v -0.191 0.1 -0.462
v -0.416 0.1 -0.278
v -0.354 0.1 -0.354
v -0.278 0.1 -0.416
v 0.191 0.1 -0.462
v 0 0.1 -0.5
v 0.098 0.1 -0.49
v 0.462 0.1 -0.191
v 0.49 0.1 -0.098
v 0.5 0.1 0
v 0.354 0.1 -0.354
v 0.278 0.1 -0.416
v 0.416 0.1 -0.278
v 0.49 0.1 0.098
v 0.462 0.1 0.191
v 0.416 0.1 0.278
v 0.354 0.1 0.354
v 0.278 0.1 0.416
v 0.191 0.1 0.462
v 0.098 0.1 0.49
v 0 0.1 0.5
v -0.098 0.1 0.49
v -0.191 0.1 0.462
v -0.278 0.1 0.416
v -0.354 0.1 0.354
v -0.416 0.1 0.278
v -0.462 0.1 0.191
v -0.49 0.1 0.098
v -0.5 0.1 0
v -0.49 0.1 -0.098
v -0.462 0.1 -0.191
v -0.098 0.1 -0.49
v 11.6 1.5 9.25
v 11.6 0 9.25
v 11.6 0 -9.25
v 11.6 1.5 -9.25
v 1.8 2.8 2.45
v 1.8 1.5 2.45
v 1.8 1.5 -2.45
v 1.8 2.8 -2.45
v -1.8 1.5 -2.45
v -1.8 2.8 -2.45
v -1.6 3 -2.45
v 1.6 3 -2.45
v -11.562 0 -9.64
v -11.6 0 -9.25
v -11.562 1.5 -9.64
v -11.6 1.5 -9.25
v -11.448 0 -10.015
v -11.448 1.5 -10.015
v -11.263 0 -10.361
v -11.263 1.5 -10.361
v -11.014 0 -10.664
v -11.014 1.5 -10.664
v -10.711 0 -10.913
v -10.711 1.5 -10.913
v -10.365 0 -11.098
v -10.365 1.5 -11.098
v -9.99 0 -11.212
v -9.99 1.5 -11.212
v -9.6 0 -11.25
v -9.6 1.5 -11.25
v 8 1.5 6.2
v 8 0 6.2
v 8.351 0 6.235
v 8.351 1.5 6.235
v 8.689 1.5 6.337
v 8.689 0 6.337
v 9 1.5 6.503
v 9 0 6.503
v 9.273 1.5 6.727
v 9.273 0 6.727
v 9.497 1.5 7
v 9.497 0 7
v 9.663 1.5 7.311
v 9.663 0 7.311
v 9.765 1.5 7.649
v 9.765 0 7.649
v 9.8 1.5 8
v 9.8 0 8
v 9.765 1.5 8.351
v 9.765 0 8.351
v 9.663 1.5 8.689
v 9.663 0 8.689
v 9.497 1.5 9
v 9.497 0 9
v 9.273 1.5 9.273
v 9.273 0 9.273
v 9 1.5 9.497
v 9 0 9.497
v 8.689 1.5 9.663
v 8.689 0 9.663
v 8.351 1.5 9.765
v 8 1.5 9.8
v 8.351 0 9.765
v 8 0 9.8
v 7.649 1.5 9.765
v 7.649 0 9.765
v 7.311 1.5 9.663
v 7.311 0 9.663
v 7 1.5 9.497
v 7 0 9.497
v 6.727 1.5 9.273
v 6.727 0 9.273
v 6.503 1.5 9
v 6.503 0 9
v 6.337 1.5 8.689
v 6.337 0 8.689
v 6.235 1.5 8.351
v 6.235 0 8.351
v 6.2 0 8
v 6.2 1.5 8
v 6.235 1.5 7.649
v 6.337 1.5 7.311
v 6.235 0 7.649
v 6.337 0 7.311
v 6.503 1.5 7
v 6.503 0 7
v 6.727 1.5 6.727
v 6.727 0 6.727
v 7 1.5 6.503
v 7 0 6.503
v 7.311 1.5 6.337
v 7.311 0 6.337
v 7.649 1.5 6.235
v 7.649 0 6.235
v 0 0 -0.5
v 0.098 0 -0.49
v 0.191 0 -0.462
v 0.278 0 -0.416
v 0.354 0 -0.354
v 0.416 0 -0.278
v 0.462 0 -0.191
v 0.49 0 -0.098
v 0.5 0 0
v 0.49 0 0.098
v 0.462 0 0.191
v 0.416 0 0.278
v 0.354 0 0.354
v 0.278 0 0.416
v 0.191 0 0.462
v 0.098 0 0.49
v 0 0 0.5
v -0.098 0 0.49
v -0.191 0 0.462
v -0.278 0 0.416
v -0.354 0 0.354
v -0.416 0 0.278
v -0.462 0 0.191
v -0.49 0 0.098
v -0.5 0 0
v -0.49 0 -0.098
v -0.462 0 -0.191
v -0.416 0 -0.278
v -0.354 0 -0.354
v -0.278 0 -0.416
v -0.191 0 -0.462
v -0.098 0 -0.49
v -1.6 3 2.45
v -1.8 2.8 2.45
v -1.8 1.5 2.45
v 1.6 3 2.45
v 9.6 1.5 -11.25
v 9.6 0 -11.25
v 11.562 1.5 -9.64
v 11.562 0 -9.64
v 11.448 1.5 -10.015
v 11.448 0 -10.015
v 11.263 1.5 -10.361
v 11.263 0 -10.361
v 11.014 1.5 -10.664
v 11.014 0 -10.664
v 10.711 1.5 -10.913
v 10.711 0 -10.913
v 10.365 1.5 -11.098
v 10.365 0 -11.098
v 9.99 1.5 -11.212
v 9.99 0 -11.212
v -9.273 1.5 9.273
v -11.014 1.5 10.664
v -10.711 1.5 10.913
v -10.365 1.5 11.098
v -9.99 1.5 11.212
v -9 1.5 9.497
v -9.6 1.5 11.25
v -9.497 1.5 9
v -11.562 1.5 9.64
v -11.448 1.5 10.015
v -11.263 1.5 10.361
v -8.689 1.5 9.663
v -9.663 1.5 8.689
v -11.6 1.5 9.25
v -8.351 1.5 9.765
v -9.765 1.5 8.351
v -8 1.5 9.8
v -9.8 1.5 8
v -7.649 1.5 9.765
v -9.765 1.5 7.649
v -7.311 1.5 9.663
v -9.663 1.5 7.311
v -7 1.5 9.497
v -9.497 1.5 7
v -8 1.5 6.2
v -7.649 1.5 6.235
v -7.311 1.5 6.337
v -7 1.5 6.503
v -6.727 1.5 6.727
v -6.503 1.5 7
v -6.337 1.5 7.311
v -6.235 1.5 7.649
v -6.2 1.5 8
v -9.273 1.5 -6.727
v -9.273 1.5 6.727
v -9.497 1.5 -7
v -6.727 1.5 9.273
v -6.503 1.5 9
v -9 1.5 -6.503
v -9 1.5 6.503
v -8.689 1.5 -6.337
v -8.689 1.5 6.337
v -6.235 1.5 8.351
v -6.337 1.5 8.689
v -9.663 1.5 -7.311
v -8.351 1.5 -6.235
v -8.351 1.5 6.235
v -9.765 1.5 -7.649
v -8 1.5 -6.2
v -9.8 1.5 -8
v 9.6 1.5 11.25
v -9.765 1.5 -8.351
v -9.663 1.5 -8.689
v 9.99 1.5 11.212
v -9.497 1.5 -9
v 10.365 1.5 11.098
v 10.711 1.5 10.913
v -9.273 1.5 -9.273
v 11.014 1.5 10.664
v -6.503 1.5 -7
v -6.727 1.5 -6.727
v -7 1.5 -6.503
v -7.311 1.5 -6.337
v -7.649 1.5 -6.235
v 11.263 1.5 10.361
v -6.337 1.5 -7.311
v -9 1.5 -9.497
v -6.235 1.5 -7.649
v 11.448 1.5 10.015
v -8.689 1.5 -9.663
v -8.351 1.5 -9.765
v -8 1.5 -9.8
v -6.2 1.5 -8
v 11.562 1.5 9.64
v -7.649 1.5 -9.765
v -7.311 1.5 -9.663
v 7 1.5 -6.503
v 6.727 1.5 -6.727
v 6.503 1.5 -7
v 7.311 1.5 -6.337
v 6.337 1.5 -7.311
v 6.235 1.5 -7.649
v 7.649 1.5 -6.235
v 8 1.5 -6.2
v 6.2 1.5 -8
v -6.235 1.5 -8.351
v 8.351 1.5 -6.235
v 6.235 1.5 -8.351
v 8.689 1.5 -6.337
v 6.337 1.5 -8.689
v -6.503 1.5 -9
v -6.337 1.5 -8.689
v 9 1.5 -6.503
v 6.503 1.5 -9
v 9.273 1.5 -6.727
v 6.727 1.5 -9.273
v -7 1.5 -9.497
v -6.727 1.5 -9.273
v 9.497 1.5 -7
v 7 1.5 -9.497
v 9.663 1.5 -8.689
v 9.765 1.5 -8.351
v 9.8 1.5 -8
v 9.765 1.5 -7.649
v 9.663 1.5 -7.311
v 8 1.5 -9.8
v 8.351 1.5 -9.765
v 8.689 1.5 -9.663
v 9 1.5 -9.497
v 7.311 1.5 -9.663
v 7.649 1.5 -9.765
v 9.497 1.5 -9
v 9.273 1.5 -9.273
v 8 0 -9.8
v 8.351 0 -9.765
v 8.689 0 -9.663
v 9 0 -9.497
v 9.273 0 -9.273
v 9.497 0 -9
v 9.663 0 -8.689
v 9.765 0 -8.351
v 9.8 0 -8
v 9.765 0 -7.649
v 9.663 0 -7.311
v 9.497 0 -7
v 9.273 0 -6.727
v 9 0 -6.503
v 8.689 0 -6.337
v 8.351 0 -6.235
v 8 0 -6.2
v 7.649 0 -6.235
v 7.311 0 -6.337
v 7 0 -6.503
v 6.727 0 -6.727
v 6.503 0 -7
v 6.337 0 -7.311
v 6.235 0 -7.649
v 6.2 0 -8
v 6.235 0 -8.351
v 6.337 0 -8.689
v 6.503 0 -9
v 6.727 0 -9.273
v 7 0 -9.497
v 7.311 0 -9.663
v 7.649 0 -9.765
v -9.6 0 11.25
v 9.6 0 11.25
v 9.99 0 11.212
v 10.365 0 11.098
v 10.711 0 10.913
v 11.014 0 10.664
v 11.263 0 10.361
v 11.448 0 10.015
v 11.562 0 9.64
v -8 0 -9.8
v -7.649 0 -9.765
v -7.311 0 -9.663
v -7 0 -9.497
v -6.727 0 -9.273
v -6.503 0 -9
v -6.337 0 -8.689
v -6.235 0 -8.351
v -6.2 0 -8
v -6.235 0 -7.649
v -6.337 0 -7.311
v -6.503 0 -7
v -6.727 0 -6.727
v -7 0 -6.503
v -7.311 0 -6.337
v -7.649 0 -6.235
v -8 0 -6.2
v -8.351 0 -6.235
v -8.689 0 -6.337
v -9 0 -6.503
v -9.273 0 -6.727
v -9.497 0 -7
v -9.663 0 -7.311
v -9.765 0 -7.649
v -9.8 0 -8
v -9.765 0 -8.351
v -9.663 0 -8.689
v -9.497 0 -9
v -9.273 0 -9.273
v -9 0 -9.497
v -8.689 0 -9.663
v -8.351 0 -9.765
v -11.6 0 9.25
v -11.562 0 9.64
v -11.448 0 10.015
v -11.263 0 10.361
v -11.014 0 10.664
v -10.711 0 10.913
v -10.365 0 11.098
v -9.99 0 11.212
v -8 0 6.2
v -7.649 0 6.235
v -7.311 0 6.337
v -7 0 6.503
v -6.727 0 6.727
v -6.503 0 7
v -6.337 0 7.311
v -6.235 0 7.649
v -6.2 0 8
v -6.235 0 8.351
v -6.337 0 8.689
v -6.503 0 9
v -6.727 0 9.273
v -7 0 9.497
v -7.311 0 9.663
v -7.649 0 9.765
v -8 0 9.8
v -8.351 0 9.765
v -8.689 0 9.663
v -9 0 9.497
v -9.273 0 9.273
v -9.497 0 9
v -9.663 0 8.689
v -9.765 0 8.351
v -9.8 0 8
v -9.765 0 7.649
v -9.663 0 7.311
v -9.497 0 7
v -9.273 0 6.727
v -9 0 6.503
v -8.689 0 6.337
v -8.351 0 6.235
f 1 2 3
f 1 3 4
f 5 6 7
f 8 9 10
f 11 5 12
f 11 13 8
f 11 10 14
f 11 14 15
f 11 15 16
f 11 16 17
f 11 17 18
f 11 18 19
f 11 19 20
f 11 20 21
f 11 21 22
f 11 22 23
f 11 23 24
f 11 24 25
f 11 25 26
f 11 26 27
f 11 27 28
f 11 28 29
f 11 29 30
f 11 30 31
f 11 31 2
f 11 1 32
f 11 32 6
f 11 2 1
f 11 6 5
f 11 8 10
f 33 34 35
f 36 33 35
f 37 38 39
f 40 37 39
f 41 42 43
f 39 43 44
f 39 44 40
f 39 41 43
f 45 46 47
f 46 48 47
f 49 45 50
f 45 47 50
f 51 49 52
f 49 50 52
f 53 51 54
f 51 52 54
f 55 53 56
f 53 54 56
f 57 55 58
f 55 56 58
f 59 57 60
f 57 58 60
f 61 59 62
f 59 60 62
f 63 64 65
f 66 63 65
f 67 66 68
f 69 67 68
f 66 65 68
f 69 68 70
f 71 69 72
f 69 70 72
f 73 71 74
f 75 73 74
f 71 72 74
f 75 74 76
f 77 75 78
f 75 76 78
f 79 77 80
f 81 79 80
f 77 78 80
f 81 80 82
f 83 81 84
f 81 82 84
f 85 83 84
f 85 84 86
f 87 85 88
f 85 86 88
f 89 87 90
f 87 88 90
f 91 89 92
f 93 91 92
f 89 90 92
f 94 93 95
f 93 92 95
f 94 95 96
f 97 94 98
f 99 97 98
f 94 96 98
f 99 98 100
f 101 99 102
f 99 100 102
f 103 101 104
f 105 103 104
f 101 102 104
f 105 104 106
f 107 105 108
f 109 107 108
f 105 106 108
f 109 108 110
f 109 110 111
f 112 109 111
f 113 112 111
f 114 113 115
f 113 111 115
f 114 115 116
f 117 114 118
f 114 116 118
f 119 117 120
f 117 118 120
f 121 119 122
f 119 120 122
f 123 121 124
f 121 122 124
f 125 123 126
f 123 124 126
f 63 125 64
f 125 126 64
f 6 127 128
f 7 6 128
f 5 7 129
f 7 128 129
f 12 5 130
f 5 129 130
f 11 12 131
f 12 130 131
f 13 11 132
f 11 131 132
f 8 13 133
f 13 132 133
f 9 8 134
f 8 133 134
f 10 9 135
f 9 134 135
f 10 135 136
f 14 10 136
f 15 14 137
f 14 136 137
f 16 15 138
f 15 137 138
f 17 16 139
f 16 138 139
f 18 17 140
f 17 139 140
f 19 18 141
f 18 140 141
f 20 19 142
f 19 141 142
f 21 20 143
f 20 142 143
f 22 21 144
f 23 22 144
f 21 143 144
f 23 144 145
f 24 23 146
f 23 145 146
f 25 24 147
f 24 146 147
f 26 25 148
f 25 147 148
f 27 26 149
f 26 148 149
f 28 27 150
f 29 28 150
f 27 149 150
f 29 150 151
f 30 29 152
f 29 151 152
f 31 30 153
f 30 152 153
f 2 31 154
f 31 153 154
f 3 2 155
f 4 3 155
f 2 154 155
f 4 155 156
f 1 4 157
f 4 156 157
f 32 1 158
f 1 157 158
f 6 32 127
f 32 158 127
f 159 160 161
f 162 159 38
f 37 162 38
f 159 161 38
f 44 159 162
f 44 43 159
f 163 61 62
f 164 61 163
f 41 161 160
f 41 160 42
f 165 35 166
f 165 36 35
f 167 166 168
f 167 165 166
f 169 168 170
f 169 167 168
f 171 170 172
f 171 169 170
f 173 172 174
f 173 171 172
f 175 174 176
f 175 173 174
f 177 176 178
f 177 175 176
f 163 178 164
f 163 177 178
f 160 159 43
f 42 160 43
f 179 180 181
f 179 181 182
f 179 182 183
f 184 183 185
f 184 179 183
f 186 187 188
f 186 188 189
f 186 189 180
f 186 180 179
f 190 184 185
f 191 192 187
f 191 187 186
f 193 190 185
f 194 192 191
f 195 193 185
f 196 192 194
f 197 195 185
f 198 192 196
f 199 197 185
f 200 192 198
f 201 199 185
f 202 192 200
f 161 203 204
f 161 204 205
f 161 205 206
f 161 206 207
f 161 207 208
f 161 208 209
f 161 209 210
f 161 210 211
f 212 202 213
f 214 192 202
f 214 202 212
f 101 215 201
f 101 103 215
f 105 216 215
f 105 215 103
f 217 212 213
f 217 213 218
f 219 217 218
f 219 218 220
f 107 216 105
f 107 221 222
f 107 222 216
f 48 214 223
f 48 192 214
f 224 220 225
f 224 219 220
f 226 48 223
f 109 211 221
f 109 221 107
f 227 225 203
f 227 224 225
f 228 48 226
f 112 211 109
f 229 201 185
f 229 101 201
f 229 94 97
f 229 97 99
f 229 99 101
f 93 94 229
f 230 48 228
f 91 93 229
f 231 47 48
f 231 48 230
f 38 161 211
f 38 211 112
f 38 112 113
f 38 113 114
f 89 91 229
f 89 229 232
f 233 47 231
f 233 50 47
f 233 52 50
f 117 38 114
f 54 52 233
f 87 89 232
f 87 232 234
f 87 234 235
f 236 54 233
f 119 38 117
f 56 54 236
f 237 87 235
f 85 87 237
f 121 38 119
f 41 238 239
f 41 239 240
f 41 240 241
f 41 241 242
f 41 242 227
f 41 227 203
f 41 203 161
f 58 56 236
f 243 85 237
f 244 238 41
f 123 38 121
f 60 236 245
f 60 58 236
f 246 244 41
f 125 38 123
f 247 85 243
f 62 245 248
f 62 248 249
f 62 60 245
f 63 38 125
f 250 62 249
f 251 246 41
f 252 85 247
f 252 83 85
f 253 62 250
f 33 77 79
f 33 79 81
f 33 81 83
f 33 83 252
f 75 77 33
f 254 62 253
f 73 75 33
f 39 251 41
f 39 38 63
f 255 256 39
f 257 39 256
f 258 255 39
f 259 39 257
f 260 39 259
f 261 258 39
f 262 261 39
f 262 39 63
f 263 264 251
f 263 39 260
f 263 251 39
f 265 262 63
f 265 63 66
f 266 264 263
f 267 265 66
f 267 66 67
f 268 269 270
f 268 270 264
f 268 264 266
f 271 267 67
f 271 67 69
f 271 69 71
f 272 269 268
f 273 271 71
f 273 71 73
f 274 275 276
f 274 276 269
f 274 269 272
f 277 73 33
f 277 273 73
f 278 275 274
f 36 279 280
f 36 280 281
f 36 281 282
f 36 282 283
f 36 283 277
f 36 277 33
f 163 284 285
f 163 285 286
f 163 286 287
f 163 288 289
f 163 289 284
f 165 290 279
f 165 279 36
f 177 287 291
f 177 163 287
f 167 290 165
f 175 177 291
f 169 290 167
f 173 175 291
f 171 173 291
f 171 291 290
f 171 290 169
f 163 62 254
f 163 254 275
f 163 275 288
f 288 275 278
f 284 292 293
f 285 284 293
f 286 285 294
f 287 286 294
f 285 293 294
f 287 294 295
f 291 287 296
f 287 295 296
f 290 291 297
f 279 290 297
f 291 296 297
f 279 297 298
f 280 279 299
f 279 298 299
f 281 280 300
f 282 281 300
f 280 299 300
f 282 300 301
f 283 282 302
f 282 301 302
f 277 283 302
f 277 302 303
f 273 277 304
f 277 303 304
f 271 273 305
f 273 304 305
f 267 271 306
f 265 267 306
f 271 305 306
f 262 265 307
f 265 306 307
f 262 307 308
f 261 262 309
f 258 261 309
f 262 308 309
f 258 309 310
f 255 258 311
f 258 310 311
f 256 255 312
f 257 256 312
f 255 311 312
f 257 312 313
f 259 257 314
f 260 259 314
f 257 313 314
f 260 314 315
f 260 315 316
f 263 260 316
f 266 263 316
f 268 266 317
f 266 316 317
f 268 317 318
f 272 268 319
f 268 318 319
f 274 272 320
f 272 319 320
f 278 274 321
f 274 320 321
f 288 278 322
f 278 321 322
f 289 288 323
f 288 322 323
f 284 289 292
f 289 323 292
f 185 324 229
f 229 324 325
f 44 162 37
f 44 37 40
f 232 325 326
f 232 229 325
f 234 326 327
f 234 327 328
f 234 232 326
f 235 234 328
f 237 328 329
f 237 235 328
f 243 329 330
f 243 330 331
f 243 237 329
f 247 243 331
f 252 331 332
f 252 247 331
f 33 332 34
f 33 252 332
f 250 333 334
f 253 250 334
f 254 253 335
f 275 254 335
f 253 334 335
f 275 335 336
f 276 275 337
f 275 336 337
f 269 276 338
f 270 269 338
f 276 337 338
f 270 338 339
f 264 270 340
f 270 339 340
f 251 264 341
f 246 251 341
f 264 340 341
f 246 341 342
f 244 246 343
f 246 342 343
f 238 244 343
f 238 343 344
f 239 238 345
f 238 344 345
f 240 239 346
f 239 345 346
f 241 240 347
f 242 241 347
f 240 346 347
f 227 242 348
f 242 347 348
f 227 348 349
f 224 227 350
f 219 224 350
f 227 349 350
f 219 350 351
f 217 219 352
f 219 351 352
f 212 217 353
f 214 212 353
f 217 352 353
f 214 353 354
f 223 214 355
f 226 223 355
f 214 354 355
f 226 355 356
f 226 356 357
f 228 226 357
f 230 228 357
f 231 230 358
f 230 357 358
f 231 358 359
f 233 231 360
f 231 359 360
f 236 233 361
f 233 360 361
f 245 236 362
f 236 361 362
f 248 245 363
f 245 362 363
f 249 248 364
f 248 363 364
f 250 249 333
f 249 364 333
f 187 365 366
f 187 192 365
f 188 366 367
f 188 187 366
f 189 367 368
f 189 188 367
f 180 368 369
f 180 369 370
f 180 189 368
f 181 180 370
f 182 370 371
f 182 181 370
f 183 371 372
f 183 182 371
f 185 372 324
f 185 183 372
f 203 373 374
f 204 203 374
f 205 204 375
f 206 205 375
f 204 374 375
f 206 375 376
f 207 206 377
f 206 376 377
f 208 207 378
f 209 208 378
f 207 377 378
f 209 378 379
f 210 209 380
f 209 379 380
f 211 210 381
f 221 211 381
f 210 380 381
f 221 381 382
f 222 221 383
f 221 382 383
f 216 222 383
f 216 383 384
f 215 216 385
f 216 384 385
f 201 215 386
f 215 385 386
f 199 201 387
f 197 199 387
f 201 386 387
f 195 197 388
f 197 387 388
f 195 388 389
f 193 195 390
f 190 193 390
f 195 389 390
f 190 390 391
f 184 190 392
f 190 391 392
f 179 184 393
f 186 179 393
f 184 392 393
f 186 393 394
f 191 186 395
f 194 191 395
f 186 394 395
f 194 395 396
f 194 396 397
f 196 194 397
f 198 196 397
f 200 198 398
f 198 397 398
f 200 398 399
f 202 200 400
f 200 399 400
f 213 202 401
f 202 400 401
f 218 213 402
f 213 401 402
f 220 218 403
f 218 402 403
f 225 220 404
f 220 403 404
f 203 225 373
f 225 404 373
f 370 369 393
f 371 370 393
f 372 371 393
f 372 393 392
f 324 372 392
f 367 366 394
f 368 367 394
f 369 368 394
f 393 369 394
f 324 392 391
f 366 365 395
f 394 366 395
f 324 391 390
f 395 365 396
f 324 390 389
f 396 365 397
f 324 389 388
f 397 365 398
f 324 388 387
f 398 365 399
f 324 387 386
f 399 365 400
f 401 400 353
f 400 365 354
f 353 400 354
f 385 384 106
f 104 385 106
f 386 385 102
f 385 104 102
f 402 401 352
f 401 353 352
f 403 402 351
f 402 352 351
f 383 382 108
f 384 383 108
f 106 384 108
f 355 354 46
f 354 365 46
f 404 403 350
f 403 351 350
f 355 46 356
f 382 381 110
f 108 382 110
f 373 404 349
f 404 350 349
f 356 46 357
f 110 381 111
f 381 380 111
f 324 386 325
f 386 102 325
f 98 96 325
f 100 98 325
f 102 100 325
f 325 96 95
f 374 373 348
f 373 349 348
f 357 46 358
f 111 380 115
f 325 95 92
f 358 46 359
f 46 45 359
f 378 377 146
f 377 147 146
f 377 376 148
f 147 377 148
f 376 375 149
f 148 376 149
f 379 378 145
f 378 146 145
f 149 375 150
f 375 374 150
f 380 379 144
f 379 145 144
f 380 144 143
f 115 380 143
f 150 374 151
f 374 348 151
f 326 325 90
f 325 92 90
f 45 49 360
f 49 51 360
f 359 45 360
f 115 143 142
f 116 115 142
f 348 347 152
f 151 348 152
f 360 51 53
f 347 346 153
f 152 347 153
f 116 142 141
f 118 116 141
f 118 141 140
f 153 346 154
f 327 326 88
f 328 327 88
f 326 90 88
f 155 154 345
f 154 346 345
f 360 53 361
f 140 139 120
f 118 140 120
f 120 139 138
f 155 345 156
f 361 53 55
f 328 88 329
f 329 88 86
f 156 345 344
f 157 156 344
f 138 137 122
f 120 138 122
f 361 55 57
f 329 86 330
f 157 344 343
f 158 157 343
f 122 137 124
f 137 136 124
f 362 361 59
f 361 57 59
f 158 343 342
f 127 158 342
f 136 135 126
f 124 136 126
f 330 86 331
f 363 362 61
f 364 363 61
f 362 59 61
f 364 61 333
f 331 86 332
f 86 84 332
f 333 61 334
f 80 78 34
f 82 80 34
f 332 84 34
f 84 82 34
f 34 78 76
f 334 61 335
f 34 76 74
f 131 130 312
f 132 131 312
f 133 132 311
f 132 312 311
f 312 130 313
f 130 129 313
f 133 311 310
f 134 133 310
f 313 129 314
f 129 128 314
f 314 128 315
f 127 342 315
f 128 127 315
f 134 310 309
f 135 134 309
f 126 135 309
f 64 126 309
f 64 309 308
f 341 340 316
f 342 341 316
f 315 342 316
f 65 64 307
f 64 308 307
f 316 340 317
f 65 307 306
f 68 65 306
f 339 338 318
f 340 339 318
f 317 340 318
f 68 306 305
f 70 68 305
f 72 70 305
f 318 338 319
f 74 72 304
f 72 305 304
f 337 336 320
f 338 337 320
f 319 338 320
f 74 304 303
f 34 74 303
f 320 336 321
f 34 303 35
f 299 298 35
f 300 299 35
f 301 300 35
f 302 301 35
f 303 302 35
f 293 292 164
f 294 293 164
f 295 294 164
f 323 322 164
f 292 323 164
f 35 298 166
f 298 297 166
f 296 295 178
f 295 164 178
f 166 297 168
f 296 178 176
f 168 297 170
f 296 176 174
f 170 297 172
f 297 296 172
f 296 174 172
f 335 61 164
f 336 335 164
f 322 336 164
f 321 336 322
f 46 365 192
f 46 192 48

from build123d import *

# Parameters (mm, degrees)
SKETCH_1_W          = 23.2
SKETCH_1_H          = 22.5
EXTRUDE_1_DEPTH     = 1.5
FILLET_1_R          = 2
SKETCH_2_R          = 1.8
CUT_EXTRUDE_1_DEPTH = 1.5
SKETCH_3_W          = 3.6
SKETCH_3_H          = 4.9
EXTRUDE_2_DEPTH     = 1.5
CHAMFER_1_SIZE      = 0.2
SKETCH_17_R         = 0.5
CUT_EXTRUDE_2_DEPTH = 0.1


with BuildPart() as part:
    # 草图1 → 凸台-拉伸1 (new body)
    with BuildSketch(Plane(origin=(0, 0, 0), x_dir=(1, 0, 0), z_dir=(0, 1, 0))):
        Rectangle(SKETCH_1_W, SKETCH_1_H)
    extrude(amount=EXTRUDE_1_DEPTH)

    # 圆角1
    fillet_1_edges = [part.edges().sort_by_distance(p)[0] for p in [
        (11.6, 0.75, 11.25),
        (-11.6, 0.75, 11.25),
        (-11.6, 0.75, -11.25),
        (11.6, 0.75, -11.25),
    ]]
    fillet(fillet_1_edges, radius=FILLET_1_R)

    # 草图2 → 切除-拉伸1 (cut)
    with BuildSketch(Plane.XZ):
        with Locations(Location((-8, 8, 0), (0, 0, 270))):
            Circle(SKETCH_2_R)
        with Locations(Location((8, 8, 0), (0, 0, 270))):
            Circle(SKETCH_2_R)
        with Locations(Location((8, -8, 0), (0, 0, 270))):
            Circle(SKETCH_2_R)
        with Locations(Location((-8, -8, 0), (0, 0, 270))):
            Circle(SKETCH_2_R)
    extrude(amount=-CUT_EXTRUDE_1_DEPTH, mode=Mode.SUBTRACT)

    # 草图3 → 凸台-拉伸2 (add)
    with BuildSketch(Plane(origin=(0, 1.5, 0), x_dir=(1, 0, 0), z_dir=(0, 1, 0))):
        Rectangle(SKETCH_3_W, SKETCH_3_H)
    extrude(amount=EXTRUDE_2_DEPTH)

    # 倒角1
    chamfer_1_edges = [part.edges().sort_by_distance(p)[0] for p in [
        (1.8, 3, 0),
        (-1.8, 3, 0),
    ]]
    chamfer(chamfer_1_edges, length=CHAMFER_1_SIZE)

    # 草图17 → 切除-拉伸2 (cut)
    with BuildSketch(Plane.XZ):
        with Locations(Location((0, 0, 0), (0, 0, 270))):
            Circle(SKETCH_17_R)
    extrude(amount=-CUT_EXTRUDE_2_DEPTH, mode=Mode.SUBTRACT)


solid = part.part
